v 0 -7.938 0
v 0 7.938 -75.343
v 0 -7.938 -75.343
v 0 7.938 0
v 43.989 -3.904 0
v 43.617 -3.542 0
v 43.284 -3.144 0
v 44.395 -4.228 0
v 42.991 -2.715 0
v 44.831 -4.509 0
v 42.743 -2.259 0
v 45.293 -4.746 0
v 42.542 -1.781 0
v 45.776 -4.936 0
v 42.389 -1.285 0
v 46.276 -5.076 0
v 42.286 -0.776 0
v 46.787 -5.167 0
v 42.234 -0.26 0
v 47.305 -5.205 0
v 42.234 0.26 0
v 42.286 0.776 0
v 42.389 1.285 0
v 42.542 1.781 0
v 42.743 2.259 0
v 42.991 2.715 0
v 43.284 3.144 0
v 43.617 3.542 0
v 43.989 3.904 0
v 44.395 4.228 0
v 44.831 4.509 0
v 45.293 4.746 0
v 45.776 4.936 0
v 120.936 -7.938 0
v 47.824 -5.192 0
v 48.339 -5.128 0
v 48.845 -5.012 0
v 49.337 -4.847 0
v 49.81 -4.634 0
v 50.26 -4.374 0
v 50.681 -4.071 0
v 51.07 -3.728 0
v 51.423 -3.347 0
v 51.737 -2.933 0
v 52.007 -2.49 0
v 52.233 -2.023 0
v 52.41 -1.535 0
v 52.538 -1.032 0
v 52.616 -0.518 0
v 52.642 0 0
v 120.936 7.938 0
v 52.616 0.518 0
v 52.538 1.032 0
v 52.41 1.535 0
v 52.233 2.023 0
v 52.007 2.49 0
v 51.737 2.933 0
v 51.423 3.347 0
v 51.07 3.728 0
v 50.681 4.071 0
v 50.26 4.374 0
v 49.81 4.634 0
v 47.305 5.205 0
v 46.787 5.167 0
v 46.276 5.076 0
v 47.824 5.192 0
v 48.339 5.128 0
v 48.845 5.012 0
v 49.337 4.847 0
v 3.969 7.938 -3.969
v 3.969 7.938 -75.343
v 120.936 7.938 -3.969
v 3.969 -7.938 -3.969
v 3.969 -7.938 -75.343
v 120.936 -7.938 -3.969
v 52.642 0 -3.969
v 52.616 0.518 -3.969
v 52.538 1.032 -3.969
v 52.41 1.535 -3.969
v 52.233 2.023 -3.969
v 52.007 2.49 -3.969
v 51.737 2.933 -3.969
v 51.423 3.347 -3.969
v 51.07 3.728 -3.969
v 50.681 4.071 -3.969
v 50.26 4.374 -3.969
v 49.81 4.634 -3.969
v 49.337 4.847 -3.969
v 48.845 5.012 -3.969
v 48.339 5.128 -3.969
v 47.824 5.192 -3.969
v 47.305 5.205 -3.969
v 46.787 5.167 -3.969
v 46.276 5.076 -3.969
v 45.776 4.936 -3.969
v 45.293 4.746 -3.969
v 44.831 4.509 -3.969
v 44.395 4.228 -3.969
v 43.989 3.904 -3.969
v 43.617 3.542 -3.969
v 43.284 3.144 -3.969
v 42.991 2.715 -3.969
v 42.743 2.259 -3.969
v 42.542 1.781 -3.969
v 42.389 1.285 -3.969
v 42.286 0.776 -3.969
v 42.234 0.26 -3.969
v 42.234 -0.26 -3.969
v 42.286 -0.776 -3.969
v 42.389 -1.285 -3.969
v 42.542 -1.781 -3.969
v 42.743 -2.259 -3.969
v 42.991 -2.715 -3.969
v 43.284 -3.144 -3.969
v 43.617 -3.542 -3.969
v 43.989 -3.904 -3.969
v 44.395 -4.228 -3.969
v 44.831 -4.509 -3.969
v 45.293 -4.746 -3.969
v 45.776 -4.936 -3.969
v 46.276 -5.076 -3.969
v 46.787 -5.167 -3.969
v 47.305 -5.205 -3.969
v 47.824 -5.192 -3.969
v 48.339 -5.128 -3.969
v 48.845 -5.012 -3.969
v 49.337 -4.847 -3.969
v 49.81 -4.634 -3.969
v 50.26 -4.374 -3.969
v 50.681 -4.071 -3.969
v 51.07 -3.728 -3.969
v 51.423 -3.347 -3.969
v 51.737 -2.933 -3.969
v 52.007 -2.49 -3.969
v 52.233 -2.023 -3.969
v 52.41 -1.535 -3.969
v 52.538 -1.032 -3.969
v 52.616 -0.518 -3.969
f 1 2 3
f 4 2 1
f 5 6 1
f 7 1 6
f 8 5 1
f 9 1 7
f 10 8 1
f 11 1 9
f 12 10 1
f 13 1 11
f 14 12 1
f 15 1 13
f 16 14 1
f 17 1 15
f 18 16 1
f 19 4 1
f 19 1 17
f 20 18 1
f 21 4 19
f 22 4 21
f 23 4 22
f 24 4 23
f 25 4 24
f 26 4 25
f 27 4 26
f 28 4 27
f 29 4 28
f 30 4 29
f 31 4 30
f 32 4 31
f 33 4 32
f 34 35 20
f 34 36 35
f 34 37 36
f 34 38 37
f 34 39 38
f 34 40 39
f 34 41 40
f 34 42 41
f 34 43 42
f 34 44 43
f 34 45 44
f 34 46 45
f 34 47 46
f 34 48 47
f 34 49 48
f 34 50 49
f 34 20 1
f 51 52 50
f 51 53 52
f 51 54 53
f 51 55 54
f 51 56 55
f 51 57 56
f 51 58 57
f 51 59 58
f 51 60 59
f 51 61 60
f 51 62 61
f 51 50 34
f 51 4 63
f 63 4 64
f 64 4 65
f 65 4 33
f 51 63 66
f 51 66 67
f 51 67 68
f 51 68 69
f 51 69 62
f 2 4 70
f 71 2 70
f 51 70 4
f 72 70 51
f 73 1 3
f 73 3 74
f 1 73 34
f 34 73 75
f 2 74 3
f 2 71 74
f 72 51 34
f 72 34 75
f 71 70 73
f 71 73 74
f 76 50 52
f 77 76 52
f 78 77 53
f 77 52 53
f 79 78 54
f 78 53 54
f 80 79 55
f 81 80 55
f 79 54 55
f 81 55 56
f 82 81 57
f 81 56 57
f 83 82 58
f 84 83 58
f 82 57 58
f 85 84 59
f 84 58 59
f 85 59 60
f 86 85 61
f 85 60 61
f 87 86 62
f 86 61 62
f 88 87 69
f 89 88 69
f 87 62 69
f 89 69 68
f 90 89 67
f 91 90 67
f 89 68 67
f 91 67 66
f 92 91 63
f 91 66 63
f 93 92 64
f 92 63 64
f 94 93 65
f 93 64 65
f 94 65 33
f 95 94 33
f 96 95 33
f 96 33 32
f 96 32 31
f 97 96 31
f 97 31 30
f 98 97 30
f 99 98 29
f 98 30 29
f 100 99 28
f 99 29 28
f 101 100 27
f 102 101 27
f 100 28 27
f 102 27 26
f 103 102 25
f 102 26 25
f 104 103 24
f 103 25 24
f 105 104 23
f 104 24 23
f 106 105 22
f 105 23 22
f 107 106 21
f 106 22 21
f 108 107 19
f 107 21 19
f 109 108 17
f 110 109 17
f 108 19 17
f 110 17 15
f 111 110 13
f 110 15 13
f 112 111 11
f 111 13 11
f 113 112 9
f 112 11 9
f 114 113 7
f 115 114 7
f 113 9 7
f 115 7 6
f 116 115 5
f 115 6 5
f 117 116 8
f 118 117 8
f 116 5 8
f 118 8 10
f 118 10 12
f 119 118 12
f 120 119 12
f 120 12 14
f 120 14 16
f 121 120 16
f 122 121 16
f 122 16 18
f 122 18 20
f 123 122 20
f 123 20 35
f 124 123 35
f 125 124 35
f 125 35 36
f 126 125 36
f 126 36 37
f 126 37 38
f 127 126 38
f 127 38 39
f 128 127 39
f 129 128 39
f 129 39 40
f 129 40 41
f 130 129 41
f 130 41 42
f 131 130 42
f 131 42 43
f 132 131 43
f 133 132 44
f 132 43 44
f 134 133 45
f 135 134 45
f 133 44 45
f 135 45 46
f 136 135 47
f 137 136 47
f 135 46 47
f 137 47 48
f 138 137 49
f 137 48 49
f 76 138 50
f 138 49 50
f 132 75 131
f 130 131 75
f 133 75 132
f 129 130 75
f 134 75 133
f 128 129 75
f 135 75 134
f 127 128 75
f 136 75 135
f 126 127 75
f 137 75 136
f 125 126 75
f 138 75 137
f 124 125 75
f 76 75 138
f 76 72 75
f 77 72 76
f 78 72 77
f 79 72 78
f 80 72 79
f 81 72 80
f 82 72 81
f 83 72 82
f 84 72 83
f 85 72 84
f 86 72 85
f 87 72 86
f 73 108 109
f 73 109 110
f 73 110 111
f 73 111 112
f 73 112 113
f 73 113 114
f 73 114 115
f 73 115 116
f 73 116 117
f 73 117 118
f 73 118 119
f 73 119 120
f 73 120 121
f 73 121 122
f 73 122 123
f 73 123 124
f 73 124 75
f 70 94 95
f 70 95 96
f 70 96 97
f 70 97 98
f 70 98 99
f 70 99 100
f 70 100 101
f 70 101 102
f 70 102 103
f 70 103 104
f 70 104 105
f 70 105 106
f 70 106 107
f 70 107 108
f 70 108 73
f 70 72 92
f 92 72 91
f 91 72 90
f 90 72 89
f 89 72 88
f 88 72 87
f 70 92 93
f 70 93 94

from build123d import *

# Parameters (mm, degrees)
BOSS_EXTRUDE1_DEPTH = 7.9375
SKETCH2_R           = 5.207
CUT_EXTRUDE1_DEPTH  = 3.96875


with BuildPart() as part:
    # Sketch1 → Boss-Extrude1 (new, symmetric)
    with BuildSketch(Plane(origin=(0, 0, 0), x_dir=(1, 0, 0), z_dir=(0, 1, 0))):
        Polygon((0, 0), (3.96875, 0), (120.93575, 0), (120.93575, 3.96875), (3.96875, 3.96875), (3.96875, 75.34275), (0, 75.34275), align=None)
    extrude(amount=BOSS_EXTRUDE1_DEPTH, both=True)

    # Sketch2 → Cut-Extrude1 (cut)
    with BuildSketch(Plane.XY):
        with Locations((47.4345, 0)):
            Circle(SKETCH2_R)
    extrude(amount=-CUT_EXTRUDE1_DEPTH, mode=Mode.SUBTRACT)


solid = part.part
